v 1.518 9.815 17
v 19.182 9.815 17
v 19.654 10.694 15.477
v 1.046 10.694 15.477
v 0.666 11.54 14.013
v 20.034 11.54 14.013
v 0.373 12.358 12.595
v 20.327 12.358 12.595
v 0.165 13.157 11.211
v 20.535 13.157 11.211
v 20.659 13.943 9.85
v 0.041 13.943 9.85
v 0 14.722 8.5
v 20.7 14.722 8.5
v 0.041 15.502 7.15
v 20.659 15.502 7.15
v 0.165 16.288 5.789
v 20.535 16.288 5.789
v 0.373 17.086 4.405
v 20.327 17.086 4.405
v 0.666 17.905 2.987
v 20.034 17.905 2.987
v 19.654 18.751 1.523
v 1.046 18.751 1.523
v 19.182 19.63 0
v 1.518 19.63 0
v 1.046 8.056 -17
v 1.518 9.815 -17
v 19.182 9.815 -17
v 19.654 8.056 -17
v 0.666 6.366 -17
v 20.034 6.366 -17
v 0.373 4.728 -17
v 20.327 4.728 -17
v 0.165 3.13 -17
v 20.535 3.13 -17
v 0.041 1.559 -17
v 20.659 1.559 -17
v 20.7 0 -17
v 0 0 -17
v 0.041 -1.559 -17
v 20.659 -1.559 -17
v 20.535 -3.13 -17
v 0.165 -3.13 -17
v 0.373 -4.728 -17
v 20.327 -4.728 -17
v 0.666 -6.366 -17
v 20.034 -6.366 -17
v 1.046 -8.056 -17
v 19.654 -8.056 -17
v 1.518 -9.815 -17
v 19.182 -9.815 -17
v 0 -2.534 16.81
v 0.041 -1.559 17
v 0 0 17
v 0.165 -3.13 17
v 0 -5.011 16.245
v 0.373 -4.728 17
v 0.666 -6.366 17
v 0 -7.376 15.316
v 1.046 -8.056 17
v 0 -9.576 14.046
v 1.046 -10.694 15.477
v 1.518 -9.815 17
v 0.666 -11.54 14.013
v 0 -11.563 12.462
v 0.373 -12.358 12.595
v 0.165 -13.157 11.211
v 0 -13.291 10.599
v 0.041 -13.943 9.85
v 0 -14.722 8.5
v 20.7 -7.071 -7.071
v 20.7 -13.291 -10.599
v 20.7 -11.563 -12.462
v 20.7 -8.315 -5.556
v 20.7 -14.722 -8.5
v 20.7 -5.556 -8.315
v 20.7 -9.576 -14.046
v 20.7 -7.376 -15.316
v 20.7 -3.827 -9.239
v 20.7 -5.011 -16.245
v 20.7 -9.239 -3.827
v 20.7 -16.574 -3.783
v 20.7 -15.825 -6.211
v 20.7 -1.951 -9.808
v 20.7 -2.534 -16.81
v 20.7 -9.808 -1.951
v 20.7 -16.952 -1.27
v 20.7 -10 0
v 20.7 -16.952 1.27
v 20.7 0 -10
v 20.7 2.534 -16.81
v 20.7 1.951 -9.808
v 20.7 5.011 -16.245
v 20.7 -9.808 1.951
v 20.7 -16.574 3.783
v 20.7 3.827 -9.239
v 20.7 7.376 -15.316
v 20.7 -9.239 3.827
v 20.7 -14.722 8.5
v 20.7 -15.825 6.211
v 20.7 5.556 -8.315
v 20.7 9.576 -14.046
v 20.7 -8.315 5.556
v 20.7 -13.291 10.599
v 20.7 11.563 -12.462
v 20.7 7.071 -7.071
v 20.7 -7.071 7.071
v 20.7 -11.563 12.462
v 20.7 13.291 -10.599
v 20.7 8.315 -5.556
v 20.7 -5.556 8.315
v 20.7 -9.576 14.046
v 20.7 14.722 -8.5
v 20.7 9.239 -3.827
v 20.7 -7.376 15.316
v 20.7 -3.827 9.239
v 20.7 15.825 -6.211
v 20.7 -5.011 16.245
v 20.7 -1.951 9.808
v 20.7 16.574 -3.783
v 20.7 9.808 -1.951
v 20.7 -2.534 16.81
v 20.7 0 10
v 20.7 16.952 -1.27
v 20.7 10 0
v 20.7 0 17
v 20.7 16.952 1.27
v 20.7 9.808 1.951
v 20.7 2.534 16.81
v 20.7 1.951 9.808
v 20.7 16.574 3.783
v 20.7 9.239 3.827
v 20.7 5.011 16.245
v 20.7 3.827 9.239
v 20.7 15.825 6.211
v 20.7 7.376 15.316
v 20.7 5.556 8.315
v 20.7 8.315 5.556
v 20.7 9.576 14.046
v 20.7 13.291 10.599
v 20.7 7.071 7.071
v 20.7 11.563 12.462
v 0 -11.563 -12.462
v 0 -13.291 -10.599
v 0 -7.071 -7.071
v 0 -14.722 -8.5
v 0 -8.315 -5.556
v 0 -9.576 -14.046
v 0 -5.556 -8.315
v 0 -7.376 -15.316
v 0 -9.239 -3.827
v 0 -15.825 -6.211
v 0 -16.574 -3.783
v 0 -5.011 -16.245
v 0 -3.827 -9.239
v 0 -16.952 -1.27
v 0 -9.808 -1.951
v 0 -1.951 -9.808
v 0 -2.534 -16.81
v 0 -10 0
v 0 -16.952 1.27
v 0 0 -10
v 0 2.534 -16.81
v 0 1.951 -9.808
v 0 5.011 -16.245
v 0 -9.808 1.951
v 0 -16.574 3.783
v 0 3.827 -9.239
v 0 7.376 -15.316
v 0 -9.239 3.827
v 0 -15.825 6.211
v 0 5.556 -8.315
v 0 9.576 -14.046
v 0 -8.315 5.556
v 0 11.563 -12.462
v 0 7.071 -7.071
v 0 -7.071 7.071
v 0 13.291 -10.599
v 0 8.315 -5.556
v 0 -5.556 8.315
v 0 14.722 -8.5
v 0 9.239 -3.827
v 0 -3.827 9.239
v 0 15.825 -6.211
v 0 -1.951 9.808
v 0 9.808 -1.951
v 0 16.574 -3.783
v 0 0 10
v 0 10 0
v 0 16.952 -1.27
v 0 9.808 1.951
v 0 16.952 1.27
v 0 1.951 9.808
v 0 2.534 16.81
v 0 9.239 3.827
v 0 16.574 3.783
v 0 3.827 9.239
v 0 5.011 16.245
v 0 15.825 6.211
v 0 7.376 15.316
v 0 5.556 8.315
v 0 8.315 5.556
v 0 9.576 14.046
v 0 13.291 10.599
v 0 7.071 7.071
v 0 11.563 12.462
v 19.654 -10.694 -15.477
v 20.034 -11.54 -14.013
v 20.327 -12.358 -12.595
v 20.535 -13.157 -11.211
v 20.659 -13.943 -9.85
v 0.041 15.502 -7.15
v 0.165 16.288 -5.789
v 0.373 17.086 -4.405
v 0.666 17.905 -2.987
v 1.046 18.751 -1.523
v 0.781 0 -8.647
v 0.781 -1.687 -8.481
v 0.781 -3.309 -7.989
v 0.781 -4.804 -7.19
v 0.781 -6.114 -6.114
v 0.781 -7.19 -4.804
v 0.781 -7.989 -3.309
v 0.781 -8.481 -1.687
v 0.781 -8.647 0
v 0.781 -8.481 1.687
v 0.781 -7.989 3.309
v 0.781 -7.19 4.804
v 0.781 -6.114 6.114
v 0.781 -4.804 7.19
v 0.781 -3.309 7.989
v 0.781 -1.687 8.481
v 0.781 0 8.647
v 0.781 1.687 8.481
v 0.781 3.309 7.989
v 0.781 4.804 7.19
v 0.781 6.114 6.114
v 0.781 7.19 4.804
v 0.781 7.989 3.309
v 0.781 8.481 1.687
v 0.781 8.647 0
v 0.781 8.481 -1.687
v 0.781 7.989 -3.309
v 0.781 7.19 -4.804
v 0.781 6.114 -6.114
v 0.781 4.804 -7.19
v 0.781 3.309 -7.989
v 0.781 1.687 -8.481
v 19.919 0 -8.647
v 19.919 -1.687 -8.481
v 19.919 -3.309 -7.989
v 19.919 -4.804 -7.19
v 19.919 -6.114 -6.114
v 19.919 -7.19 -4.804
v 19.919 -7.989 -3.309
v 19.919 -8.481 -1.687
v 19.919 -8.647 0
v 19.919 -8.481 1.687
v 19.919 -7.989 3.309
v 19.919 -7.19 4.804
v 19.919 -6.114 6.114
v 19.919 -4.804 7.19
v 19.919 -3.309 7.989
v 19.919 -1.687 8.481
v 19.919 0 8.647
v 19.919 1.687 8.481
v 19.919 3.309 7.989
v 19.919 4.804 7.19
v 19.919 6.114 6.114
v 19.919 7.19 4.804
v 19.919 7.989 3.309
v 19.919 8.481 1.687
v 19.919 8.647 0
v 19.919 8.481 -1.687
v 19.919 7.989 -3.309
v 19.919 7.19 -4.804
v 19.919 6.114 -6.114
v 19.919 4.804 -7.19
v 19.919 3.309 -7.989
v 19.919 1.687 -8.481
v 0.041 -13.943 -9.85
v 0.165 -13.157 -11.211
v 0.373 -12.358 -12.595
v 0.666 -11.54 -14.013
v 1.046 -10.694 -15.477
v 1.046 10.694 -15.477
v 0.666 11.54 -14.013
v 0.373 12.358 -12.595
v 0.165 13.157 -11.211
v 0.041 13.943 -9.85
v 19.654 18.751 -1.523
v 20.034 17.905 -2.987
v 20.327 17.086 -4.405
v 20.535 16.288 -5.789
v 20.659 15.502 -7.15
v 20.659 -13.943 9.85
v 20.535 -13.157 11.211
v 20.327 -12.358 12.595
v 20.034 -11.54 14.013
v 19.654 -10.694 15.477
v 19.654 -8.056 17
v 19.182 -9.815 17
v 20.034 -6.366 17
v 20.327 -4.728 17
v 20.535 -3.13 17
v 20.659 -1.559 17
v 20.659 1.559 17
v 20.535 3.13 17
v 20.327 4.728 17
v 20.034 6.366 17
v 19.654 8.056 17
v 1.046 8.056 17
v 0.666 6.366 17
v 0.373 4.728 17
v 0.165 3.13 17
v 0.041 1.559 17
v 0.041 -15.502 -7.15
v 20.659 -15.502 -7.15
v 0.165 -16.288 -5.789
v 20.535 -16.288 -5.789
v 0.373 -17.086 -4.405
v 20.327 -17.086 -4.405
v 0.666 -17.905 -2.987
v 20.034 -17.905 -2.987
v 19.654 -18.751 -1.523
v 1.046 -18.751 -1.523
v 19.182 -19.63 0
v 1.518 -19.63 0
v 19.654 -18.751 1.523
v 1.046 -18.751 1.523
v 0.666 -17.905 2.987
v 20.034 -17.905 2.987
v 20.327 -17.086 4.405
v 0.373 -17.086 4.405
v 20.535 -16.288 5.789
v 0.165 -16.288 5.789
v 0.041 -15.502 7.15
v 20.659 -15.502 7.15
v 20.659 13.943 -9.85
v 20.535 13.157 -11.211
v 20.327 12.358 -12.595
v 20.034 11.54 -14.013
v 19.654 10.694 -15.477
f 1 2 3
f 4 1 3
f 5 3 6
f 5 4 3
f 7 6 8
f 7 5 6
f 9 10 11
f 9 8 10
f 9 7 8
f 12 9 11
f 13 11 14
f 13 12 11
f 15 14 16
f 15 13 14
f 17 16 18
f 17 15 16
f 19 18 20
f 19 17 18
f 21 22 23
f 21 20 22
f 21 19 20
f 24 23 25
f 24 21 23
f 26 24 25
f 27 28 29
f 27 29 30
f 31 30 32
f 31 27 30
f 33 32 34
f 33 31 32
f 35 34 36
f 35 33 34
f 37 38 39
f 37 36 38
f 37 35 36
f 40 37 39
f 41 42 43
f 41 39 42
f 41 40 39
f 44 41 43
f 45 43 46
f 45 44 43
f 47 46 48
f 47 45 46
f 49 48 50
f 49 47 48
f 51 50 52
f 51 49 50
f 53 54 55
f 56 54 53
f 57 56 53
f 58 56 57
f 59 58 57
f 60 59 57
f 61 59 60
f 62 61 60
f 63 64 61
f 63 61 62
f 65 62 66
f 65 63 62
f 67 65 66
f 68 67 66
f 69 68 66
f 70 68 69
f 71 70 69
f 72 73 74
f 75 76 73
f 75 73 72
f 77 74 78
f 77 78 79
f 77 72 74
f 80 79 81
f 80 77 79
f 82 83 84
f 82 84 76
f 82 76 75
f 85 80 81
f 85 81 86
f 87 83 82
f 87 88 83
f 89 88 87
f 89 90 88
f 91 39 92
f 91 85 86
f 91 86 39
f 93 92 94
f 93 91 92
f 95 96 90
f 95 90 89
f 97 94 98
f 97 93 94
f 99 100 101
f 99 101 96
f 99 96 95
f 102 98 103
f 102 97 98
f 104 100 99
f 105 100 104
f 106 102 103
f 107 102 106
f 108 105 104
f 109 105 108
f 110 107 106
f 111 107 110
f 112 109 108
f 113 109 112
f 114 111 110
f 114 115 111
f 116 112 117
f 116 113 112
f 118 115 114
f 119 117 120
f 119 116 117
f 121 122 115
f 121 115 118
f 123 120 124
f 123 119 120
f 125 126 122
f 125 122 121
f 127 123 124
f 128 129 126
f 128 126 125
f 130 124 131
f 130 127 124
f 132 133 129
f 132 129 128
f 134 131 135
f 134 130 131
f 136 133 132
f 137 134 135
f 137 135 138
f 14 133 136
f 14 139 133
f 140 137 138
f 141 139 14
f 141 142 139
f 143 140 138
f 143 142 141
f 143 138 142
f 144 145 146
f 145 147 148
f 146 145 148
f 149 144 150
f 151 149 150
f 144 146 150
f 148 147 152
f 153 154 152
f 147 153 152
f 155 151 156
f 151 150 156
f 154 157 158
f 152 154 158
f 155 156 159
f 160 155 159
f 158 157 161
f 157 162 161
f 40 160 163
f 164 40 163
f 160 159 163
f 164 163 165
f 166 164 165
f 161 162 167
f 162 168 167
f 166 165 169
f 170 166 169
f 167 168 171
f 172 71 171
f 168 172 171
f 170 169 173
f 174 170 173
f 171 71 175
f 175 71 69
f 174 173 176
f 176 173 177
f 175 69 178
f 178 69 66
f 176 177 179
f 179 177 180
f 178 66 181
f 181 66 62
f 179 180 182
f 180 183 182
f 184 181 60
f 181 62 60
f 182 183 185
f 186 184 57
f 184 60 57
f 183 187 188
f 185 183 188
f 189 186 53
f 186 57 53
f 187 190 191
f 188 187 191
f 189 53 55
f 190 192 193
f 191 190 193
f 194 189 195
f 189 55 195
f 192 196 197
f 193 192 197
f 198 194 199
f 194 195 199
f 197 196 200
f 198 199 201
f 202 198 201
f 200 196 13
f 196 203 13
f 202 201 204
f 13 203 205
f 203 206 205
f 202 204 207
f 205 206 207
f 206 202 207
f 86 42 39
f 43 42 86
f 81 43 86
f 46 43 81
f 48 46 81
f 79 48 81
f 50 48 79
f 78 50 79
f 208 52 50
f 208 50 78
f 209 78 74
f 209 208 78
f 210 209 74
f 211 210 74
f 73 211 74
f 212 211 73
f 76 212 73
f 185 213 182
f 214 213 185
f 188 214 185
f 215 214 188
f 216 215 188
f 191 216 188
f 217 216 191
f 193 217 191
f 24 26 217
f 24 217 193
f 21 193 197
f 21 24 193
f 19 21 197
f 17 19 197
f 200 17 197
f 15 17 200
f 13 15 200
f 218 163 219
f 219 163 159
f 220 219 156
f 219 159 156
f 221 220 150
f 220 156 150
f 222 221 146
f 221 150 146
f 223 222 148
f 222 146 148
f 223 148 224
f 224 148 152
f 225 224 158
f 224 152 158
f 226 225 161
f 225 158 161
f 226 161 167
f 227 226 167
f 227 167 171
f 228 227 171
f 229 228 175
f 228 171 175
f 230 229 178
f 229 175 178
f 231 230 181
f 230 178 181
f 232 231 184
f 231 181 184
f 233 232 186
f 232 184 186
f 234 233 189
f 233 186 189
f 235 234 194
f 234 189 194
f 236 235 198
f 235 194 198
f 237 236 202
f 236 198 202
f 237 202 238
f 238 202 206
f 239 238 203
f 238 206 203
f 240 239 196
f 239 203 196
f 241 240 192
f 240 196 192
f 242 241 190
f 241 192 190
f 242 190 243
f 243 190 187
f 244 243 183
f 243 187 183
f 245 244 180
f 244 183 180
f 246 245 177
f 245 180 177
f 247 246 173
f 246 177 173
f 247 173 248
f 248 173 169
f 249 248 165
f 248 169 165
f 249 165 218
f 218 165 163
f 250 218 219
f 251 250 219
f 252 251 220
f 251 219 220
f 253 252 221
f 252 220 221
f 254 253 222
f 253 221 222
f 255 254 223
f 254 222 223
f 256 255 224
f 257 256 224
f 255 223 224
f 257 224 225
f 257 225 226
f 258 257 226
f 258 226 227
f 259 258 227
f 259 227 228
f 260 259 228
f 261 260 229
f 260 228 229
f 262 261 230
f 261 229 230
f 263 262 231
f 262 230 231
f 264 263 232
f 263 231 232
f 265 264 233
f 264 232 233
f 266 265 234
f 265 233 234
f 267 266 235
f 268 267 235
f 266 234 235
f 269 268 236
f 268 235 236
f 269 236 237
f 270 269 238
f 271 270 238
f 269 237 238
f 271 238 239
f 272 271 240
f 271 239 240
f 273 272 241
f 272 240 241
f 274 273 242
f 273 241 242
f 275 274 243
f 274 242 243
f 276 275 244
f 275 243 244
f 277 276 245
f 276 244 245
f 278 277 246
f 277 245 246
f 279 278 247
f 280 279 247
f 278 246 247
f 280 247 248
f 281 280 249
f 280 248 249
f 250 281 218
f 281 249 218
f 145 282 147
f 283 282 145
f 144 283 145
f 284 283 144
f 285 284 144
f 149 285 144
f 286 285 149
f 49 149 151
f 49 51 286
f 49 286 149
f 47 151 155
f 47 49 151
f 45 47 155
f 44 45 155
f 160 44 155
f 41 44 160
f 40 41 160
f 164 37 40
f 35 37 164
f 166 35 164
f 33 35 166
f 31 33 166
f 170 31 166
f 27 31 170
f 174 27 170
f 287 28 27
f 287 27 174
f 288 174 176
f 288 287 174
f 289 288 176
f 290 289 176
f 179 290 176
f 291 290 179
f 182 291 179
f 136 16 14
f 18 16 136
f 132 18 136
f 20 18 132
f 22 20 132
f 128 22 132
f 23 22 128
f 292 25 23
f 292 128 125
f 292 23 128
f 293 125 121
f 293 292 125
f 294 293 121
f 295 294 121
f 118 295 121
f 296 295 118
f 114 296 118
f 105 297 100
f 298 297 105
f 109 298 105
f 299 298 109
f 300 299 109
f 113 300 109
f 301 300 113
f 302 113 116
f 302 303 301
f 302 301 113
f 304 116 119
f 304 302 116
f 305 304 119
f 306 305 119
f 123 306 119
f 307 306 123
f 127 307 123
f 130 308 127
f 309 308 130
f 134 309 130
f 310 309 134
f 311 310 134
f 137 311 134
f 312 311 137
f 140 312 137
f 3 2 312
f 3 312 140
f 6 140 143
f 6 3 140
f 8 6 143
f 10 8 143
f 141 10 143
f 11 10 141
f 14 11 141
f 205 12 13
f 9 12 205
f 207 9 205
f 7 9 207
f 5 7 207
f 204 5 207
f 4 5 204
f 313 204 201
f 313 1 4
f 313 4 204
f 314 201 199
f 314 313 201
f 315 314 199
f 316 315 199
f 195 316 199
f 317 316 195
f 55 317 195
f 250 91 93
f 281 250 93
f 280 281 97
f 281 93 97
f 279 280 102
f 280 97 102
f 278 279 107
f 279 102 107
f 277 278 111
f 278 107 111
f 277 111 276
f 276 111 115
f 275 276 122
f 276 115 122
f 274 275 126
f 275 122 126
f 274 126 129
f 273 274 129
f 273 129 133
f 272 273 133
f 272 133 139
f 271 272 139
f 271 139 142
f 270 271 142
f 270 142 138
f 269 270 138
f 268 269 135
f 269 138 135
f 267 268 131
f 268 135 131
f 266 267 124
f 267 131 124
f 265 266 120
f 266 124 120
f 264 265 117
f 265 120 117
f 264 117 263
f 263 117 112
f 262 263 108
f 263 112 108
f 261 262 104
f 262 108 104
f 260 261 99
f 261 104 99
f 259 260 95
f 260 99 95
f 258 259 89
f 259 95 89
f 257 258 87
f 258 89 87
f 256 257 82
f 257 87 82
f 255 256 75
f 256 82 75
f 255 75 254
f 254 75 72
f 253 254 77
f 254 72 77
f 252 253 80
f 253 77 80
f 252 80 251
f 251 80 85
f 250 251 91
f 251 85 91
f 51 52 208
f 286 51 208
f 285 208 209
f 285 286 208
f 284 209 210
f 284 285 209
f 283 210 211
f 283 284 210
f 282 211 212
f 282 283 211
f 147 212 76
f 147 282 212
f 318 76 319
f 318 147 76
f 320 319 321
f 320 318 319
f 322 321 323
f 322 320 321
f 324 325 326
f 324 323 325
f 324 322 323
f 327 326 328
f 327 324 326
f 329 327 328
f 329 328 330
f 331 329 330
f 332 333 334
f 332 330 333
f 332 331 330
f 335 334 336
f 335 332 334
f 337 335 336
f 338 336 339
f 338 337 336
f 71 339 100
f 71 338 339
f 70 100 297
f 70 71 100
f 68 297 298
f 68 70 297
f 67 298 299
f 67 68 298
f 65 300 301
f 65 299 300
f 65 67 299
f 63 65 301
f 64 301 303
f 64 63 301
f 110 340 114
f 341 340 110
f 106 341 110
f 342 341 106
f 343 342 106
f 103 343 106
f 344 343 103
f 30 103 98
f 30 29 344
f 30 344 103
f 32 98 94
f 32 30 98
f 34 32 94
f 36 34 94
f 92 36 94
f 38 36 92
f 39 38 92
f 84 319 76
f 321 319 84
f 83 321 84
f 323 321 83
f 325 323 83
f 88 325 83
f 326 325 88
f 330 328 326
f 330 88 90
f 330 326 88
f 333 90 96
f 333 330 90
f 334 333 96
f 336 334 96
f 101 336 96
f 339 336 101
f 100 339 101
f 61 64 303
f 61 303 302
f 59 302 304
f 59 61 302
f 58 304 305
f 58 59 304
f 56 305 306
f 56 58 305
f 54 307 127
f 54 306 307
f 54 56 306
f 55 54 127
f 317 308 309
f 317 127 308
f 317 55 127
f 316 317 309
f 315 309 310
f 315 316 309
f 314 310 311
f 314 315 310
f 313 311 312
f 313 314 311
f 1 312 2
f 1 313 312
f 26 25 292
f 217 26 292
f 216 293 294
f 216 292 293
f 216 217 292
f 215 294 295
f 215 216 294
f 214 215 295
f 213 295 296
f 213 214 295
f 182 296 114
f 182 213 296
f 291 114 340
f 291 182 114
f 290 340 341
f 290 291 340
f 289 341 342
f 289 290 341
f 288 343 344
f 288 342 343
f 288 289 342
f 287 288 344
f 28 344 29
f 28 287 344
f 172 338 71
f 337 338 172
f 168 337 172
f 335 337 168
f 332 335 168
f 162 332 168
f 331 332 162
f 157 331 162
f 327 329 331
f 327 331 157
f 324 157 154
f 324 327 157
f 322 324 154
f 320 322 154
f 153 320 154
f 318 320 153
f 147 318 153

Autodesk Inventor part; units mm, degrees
ref_plane "YZ Plane" through (0, 0, 0) normal (1, 0, 0) x (0, 1, 0)
ref_plane "XZ Plane" through (0, 0, 0) normal (0, 1, 0) x (-1, 0, 0)
sketch "Sketch1" plane through (0, 0, 0) normal (1, 0, 0) x (0, 1, 0)
  line L0 (-19.6299, 0) -> (-9.815, 17)
  line L1 (-9.815, 17) -> (9.815, 17)
  line L2 (9.815, 17) -> (19.6299, 0)
  line L3 (19.6299, 0) -> (9.815, -17)
  line L4 (9.815, -17) -> (-9.815, -17)
  line L5 (-9.815, -17) -> (-19.6299, 0)
  point P0 (0, 0)
  point P1 (0, 0)
  dimension "d0" = 39.2598
extrude "Body" add sketch "Sketch1" along normal blind 20.7
sketch "Sketch2" plane through (0, 0, 0) normal (0, 0, 1) x (1, 0, 0)
  line L0 (0, 9.815) -> (0, 19.6299) projected
  line L1 (0, 19.6299) -> (20.7, 19.6299) projected
  line L2 (20.7, 9.815) -> (20.7, 19.6299) projected
  line L3 (-4.14, 0) -> (24.84, 0) projected
  line L4 (1.5184, 19.6299) -> (0, 17)
  line L5 (19.1816, 19.6299) -> (20.7, 17)
  dimension "d3" = 30
  dimension "d4" = 30
  dimension "d5" = 34
  dimension "d6" = 34
revolve "Chamfer1" cut sketch "Sketch2" angle 360 about axis through (-10, 0, 0) along (1, 0, 0)
sketch "Sketch3" plane through (20.7, 0, 0) normal (1, 0, 0) x (0, 0, -1)
  arc A0 (-8.5, -14.7224) -> (8.5, -14.7224) centre (0, 0) ccw projected
hole "Thread" at (20.7, 0, 0) direction (-1, 0, 0) diameter 17.294 end through all thread size "M20x2.5" class "6H" standard "ANSI Metric M Profile"
chamfer "Chamfer2" distance 1.3532 angle 30 1 edges at (20.7, 0, 8.647) measured on face at (20.7, 14.1326, -0.3474)
chamfer "Chamfer3" distance 1.3532 angle 30 1 edges at (0, 0, 8.647) measured on face at (0, 14.1326, -0.3474)
ref_plane "Work Plane1" through (-35.2091, 0, 0) normal (0, -0.8660254, -0.5) x (1, 0, 0)
equation "\"d0\" = 1.1547 * SW"
equation "\"d1\" = KOH"
equation "\"d3\" = ANG1"
equation "\"d4\" = ANG2"
equation "\"d5\" = SW0"
equation "\"d6\" = SW01"
equation "\"d8\" = -0.5 * GD1 + 0.5 * NND"
equation "\"d40\" = -0.5 * GD1 + 0.5 * NND"
equation "\"d10\" = -0.5 * GD1 + 0.5 * NND"
equation "\"d41\" = -0.5 * GD1 + 0.5 * NND"
equation "\"ANG1\" = 30deg"
equation "\"ANG2\" = 30deg"
equation "\"KOH\" = 20.7"
equation "\"SW\" = 34"
equation "\"SW0\" = SW"
equation "\"SW01\" = SW"
equation "\"GUL\" = 0.541266 * PTC"
equation "\"TOA\" = 30deg"
equation "\"PTC\" = 2.5"
equation "\"E0\" = 1.155 * SW"
equation "\"GAL\" = 0.541266 * PTC"
equation "\"SD2\" = 31.4"
equation "\"WFT\" = 0"
equation "\"GD1\" = 17.293671"
equation "\"NND\" = 20"
properties part number "ANSI B18.2.4.6M - M20 x 2.5" material "Steel, Mild"
